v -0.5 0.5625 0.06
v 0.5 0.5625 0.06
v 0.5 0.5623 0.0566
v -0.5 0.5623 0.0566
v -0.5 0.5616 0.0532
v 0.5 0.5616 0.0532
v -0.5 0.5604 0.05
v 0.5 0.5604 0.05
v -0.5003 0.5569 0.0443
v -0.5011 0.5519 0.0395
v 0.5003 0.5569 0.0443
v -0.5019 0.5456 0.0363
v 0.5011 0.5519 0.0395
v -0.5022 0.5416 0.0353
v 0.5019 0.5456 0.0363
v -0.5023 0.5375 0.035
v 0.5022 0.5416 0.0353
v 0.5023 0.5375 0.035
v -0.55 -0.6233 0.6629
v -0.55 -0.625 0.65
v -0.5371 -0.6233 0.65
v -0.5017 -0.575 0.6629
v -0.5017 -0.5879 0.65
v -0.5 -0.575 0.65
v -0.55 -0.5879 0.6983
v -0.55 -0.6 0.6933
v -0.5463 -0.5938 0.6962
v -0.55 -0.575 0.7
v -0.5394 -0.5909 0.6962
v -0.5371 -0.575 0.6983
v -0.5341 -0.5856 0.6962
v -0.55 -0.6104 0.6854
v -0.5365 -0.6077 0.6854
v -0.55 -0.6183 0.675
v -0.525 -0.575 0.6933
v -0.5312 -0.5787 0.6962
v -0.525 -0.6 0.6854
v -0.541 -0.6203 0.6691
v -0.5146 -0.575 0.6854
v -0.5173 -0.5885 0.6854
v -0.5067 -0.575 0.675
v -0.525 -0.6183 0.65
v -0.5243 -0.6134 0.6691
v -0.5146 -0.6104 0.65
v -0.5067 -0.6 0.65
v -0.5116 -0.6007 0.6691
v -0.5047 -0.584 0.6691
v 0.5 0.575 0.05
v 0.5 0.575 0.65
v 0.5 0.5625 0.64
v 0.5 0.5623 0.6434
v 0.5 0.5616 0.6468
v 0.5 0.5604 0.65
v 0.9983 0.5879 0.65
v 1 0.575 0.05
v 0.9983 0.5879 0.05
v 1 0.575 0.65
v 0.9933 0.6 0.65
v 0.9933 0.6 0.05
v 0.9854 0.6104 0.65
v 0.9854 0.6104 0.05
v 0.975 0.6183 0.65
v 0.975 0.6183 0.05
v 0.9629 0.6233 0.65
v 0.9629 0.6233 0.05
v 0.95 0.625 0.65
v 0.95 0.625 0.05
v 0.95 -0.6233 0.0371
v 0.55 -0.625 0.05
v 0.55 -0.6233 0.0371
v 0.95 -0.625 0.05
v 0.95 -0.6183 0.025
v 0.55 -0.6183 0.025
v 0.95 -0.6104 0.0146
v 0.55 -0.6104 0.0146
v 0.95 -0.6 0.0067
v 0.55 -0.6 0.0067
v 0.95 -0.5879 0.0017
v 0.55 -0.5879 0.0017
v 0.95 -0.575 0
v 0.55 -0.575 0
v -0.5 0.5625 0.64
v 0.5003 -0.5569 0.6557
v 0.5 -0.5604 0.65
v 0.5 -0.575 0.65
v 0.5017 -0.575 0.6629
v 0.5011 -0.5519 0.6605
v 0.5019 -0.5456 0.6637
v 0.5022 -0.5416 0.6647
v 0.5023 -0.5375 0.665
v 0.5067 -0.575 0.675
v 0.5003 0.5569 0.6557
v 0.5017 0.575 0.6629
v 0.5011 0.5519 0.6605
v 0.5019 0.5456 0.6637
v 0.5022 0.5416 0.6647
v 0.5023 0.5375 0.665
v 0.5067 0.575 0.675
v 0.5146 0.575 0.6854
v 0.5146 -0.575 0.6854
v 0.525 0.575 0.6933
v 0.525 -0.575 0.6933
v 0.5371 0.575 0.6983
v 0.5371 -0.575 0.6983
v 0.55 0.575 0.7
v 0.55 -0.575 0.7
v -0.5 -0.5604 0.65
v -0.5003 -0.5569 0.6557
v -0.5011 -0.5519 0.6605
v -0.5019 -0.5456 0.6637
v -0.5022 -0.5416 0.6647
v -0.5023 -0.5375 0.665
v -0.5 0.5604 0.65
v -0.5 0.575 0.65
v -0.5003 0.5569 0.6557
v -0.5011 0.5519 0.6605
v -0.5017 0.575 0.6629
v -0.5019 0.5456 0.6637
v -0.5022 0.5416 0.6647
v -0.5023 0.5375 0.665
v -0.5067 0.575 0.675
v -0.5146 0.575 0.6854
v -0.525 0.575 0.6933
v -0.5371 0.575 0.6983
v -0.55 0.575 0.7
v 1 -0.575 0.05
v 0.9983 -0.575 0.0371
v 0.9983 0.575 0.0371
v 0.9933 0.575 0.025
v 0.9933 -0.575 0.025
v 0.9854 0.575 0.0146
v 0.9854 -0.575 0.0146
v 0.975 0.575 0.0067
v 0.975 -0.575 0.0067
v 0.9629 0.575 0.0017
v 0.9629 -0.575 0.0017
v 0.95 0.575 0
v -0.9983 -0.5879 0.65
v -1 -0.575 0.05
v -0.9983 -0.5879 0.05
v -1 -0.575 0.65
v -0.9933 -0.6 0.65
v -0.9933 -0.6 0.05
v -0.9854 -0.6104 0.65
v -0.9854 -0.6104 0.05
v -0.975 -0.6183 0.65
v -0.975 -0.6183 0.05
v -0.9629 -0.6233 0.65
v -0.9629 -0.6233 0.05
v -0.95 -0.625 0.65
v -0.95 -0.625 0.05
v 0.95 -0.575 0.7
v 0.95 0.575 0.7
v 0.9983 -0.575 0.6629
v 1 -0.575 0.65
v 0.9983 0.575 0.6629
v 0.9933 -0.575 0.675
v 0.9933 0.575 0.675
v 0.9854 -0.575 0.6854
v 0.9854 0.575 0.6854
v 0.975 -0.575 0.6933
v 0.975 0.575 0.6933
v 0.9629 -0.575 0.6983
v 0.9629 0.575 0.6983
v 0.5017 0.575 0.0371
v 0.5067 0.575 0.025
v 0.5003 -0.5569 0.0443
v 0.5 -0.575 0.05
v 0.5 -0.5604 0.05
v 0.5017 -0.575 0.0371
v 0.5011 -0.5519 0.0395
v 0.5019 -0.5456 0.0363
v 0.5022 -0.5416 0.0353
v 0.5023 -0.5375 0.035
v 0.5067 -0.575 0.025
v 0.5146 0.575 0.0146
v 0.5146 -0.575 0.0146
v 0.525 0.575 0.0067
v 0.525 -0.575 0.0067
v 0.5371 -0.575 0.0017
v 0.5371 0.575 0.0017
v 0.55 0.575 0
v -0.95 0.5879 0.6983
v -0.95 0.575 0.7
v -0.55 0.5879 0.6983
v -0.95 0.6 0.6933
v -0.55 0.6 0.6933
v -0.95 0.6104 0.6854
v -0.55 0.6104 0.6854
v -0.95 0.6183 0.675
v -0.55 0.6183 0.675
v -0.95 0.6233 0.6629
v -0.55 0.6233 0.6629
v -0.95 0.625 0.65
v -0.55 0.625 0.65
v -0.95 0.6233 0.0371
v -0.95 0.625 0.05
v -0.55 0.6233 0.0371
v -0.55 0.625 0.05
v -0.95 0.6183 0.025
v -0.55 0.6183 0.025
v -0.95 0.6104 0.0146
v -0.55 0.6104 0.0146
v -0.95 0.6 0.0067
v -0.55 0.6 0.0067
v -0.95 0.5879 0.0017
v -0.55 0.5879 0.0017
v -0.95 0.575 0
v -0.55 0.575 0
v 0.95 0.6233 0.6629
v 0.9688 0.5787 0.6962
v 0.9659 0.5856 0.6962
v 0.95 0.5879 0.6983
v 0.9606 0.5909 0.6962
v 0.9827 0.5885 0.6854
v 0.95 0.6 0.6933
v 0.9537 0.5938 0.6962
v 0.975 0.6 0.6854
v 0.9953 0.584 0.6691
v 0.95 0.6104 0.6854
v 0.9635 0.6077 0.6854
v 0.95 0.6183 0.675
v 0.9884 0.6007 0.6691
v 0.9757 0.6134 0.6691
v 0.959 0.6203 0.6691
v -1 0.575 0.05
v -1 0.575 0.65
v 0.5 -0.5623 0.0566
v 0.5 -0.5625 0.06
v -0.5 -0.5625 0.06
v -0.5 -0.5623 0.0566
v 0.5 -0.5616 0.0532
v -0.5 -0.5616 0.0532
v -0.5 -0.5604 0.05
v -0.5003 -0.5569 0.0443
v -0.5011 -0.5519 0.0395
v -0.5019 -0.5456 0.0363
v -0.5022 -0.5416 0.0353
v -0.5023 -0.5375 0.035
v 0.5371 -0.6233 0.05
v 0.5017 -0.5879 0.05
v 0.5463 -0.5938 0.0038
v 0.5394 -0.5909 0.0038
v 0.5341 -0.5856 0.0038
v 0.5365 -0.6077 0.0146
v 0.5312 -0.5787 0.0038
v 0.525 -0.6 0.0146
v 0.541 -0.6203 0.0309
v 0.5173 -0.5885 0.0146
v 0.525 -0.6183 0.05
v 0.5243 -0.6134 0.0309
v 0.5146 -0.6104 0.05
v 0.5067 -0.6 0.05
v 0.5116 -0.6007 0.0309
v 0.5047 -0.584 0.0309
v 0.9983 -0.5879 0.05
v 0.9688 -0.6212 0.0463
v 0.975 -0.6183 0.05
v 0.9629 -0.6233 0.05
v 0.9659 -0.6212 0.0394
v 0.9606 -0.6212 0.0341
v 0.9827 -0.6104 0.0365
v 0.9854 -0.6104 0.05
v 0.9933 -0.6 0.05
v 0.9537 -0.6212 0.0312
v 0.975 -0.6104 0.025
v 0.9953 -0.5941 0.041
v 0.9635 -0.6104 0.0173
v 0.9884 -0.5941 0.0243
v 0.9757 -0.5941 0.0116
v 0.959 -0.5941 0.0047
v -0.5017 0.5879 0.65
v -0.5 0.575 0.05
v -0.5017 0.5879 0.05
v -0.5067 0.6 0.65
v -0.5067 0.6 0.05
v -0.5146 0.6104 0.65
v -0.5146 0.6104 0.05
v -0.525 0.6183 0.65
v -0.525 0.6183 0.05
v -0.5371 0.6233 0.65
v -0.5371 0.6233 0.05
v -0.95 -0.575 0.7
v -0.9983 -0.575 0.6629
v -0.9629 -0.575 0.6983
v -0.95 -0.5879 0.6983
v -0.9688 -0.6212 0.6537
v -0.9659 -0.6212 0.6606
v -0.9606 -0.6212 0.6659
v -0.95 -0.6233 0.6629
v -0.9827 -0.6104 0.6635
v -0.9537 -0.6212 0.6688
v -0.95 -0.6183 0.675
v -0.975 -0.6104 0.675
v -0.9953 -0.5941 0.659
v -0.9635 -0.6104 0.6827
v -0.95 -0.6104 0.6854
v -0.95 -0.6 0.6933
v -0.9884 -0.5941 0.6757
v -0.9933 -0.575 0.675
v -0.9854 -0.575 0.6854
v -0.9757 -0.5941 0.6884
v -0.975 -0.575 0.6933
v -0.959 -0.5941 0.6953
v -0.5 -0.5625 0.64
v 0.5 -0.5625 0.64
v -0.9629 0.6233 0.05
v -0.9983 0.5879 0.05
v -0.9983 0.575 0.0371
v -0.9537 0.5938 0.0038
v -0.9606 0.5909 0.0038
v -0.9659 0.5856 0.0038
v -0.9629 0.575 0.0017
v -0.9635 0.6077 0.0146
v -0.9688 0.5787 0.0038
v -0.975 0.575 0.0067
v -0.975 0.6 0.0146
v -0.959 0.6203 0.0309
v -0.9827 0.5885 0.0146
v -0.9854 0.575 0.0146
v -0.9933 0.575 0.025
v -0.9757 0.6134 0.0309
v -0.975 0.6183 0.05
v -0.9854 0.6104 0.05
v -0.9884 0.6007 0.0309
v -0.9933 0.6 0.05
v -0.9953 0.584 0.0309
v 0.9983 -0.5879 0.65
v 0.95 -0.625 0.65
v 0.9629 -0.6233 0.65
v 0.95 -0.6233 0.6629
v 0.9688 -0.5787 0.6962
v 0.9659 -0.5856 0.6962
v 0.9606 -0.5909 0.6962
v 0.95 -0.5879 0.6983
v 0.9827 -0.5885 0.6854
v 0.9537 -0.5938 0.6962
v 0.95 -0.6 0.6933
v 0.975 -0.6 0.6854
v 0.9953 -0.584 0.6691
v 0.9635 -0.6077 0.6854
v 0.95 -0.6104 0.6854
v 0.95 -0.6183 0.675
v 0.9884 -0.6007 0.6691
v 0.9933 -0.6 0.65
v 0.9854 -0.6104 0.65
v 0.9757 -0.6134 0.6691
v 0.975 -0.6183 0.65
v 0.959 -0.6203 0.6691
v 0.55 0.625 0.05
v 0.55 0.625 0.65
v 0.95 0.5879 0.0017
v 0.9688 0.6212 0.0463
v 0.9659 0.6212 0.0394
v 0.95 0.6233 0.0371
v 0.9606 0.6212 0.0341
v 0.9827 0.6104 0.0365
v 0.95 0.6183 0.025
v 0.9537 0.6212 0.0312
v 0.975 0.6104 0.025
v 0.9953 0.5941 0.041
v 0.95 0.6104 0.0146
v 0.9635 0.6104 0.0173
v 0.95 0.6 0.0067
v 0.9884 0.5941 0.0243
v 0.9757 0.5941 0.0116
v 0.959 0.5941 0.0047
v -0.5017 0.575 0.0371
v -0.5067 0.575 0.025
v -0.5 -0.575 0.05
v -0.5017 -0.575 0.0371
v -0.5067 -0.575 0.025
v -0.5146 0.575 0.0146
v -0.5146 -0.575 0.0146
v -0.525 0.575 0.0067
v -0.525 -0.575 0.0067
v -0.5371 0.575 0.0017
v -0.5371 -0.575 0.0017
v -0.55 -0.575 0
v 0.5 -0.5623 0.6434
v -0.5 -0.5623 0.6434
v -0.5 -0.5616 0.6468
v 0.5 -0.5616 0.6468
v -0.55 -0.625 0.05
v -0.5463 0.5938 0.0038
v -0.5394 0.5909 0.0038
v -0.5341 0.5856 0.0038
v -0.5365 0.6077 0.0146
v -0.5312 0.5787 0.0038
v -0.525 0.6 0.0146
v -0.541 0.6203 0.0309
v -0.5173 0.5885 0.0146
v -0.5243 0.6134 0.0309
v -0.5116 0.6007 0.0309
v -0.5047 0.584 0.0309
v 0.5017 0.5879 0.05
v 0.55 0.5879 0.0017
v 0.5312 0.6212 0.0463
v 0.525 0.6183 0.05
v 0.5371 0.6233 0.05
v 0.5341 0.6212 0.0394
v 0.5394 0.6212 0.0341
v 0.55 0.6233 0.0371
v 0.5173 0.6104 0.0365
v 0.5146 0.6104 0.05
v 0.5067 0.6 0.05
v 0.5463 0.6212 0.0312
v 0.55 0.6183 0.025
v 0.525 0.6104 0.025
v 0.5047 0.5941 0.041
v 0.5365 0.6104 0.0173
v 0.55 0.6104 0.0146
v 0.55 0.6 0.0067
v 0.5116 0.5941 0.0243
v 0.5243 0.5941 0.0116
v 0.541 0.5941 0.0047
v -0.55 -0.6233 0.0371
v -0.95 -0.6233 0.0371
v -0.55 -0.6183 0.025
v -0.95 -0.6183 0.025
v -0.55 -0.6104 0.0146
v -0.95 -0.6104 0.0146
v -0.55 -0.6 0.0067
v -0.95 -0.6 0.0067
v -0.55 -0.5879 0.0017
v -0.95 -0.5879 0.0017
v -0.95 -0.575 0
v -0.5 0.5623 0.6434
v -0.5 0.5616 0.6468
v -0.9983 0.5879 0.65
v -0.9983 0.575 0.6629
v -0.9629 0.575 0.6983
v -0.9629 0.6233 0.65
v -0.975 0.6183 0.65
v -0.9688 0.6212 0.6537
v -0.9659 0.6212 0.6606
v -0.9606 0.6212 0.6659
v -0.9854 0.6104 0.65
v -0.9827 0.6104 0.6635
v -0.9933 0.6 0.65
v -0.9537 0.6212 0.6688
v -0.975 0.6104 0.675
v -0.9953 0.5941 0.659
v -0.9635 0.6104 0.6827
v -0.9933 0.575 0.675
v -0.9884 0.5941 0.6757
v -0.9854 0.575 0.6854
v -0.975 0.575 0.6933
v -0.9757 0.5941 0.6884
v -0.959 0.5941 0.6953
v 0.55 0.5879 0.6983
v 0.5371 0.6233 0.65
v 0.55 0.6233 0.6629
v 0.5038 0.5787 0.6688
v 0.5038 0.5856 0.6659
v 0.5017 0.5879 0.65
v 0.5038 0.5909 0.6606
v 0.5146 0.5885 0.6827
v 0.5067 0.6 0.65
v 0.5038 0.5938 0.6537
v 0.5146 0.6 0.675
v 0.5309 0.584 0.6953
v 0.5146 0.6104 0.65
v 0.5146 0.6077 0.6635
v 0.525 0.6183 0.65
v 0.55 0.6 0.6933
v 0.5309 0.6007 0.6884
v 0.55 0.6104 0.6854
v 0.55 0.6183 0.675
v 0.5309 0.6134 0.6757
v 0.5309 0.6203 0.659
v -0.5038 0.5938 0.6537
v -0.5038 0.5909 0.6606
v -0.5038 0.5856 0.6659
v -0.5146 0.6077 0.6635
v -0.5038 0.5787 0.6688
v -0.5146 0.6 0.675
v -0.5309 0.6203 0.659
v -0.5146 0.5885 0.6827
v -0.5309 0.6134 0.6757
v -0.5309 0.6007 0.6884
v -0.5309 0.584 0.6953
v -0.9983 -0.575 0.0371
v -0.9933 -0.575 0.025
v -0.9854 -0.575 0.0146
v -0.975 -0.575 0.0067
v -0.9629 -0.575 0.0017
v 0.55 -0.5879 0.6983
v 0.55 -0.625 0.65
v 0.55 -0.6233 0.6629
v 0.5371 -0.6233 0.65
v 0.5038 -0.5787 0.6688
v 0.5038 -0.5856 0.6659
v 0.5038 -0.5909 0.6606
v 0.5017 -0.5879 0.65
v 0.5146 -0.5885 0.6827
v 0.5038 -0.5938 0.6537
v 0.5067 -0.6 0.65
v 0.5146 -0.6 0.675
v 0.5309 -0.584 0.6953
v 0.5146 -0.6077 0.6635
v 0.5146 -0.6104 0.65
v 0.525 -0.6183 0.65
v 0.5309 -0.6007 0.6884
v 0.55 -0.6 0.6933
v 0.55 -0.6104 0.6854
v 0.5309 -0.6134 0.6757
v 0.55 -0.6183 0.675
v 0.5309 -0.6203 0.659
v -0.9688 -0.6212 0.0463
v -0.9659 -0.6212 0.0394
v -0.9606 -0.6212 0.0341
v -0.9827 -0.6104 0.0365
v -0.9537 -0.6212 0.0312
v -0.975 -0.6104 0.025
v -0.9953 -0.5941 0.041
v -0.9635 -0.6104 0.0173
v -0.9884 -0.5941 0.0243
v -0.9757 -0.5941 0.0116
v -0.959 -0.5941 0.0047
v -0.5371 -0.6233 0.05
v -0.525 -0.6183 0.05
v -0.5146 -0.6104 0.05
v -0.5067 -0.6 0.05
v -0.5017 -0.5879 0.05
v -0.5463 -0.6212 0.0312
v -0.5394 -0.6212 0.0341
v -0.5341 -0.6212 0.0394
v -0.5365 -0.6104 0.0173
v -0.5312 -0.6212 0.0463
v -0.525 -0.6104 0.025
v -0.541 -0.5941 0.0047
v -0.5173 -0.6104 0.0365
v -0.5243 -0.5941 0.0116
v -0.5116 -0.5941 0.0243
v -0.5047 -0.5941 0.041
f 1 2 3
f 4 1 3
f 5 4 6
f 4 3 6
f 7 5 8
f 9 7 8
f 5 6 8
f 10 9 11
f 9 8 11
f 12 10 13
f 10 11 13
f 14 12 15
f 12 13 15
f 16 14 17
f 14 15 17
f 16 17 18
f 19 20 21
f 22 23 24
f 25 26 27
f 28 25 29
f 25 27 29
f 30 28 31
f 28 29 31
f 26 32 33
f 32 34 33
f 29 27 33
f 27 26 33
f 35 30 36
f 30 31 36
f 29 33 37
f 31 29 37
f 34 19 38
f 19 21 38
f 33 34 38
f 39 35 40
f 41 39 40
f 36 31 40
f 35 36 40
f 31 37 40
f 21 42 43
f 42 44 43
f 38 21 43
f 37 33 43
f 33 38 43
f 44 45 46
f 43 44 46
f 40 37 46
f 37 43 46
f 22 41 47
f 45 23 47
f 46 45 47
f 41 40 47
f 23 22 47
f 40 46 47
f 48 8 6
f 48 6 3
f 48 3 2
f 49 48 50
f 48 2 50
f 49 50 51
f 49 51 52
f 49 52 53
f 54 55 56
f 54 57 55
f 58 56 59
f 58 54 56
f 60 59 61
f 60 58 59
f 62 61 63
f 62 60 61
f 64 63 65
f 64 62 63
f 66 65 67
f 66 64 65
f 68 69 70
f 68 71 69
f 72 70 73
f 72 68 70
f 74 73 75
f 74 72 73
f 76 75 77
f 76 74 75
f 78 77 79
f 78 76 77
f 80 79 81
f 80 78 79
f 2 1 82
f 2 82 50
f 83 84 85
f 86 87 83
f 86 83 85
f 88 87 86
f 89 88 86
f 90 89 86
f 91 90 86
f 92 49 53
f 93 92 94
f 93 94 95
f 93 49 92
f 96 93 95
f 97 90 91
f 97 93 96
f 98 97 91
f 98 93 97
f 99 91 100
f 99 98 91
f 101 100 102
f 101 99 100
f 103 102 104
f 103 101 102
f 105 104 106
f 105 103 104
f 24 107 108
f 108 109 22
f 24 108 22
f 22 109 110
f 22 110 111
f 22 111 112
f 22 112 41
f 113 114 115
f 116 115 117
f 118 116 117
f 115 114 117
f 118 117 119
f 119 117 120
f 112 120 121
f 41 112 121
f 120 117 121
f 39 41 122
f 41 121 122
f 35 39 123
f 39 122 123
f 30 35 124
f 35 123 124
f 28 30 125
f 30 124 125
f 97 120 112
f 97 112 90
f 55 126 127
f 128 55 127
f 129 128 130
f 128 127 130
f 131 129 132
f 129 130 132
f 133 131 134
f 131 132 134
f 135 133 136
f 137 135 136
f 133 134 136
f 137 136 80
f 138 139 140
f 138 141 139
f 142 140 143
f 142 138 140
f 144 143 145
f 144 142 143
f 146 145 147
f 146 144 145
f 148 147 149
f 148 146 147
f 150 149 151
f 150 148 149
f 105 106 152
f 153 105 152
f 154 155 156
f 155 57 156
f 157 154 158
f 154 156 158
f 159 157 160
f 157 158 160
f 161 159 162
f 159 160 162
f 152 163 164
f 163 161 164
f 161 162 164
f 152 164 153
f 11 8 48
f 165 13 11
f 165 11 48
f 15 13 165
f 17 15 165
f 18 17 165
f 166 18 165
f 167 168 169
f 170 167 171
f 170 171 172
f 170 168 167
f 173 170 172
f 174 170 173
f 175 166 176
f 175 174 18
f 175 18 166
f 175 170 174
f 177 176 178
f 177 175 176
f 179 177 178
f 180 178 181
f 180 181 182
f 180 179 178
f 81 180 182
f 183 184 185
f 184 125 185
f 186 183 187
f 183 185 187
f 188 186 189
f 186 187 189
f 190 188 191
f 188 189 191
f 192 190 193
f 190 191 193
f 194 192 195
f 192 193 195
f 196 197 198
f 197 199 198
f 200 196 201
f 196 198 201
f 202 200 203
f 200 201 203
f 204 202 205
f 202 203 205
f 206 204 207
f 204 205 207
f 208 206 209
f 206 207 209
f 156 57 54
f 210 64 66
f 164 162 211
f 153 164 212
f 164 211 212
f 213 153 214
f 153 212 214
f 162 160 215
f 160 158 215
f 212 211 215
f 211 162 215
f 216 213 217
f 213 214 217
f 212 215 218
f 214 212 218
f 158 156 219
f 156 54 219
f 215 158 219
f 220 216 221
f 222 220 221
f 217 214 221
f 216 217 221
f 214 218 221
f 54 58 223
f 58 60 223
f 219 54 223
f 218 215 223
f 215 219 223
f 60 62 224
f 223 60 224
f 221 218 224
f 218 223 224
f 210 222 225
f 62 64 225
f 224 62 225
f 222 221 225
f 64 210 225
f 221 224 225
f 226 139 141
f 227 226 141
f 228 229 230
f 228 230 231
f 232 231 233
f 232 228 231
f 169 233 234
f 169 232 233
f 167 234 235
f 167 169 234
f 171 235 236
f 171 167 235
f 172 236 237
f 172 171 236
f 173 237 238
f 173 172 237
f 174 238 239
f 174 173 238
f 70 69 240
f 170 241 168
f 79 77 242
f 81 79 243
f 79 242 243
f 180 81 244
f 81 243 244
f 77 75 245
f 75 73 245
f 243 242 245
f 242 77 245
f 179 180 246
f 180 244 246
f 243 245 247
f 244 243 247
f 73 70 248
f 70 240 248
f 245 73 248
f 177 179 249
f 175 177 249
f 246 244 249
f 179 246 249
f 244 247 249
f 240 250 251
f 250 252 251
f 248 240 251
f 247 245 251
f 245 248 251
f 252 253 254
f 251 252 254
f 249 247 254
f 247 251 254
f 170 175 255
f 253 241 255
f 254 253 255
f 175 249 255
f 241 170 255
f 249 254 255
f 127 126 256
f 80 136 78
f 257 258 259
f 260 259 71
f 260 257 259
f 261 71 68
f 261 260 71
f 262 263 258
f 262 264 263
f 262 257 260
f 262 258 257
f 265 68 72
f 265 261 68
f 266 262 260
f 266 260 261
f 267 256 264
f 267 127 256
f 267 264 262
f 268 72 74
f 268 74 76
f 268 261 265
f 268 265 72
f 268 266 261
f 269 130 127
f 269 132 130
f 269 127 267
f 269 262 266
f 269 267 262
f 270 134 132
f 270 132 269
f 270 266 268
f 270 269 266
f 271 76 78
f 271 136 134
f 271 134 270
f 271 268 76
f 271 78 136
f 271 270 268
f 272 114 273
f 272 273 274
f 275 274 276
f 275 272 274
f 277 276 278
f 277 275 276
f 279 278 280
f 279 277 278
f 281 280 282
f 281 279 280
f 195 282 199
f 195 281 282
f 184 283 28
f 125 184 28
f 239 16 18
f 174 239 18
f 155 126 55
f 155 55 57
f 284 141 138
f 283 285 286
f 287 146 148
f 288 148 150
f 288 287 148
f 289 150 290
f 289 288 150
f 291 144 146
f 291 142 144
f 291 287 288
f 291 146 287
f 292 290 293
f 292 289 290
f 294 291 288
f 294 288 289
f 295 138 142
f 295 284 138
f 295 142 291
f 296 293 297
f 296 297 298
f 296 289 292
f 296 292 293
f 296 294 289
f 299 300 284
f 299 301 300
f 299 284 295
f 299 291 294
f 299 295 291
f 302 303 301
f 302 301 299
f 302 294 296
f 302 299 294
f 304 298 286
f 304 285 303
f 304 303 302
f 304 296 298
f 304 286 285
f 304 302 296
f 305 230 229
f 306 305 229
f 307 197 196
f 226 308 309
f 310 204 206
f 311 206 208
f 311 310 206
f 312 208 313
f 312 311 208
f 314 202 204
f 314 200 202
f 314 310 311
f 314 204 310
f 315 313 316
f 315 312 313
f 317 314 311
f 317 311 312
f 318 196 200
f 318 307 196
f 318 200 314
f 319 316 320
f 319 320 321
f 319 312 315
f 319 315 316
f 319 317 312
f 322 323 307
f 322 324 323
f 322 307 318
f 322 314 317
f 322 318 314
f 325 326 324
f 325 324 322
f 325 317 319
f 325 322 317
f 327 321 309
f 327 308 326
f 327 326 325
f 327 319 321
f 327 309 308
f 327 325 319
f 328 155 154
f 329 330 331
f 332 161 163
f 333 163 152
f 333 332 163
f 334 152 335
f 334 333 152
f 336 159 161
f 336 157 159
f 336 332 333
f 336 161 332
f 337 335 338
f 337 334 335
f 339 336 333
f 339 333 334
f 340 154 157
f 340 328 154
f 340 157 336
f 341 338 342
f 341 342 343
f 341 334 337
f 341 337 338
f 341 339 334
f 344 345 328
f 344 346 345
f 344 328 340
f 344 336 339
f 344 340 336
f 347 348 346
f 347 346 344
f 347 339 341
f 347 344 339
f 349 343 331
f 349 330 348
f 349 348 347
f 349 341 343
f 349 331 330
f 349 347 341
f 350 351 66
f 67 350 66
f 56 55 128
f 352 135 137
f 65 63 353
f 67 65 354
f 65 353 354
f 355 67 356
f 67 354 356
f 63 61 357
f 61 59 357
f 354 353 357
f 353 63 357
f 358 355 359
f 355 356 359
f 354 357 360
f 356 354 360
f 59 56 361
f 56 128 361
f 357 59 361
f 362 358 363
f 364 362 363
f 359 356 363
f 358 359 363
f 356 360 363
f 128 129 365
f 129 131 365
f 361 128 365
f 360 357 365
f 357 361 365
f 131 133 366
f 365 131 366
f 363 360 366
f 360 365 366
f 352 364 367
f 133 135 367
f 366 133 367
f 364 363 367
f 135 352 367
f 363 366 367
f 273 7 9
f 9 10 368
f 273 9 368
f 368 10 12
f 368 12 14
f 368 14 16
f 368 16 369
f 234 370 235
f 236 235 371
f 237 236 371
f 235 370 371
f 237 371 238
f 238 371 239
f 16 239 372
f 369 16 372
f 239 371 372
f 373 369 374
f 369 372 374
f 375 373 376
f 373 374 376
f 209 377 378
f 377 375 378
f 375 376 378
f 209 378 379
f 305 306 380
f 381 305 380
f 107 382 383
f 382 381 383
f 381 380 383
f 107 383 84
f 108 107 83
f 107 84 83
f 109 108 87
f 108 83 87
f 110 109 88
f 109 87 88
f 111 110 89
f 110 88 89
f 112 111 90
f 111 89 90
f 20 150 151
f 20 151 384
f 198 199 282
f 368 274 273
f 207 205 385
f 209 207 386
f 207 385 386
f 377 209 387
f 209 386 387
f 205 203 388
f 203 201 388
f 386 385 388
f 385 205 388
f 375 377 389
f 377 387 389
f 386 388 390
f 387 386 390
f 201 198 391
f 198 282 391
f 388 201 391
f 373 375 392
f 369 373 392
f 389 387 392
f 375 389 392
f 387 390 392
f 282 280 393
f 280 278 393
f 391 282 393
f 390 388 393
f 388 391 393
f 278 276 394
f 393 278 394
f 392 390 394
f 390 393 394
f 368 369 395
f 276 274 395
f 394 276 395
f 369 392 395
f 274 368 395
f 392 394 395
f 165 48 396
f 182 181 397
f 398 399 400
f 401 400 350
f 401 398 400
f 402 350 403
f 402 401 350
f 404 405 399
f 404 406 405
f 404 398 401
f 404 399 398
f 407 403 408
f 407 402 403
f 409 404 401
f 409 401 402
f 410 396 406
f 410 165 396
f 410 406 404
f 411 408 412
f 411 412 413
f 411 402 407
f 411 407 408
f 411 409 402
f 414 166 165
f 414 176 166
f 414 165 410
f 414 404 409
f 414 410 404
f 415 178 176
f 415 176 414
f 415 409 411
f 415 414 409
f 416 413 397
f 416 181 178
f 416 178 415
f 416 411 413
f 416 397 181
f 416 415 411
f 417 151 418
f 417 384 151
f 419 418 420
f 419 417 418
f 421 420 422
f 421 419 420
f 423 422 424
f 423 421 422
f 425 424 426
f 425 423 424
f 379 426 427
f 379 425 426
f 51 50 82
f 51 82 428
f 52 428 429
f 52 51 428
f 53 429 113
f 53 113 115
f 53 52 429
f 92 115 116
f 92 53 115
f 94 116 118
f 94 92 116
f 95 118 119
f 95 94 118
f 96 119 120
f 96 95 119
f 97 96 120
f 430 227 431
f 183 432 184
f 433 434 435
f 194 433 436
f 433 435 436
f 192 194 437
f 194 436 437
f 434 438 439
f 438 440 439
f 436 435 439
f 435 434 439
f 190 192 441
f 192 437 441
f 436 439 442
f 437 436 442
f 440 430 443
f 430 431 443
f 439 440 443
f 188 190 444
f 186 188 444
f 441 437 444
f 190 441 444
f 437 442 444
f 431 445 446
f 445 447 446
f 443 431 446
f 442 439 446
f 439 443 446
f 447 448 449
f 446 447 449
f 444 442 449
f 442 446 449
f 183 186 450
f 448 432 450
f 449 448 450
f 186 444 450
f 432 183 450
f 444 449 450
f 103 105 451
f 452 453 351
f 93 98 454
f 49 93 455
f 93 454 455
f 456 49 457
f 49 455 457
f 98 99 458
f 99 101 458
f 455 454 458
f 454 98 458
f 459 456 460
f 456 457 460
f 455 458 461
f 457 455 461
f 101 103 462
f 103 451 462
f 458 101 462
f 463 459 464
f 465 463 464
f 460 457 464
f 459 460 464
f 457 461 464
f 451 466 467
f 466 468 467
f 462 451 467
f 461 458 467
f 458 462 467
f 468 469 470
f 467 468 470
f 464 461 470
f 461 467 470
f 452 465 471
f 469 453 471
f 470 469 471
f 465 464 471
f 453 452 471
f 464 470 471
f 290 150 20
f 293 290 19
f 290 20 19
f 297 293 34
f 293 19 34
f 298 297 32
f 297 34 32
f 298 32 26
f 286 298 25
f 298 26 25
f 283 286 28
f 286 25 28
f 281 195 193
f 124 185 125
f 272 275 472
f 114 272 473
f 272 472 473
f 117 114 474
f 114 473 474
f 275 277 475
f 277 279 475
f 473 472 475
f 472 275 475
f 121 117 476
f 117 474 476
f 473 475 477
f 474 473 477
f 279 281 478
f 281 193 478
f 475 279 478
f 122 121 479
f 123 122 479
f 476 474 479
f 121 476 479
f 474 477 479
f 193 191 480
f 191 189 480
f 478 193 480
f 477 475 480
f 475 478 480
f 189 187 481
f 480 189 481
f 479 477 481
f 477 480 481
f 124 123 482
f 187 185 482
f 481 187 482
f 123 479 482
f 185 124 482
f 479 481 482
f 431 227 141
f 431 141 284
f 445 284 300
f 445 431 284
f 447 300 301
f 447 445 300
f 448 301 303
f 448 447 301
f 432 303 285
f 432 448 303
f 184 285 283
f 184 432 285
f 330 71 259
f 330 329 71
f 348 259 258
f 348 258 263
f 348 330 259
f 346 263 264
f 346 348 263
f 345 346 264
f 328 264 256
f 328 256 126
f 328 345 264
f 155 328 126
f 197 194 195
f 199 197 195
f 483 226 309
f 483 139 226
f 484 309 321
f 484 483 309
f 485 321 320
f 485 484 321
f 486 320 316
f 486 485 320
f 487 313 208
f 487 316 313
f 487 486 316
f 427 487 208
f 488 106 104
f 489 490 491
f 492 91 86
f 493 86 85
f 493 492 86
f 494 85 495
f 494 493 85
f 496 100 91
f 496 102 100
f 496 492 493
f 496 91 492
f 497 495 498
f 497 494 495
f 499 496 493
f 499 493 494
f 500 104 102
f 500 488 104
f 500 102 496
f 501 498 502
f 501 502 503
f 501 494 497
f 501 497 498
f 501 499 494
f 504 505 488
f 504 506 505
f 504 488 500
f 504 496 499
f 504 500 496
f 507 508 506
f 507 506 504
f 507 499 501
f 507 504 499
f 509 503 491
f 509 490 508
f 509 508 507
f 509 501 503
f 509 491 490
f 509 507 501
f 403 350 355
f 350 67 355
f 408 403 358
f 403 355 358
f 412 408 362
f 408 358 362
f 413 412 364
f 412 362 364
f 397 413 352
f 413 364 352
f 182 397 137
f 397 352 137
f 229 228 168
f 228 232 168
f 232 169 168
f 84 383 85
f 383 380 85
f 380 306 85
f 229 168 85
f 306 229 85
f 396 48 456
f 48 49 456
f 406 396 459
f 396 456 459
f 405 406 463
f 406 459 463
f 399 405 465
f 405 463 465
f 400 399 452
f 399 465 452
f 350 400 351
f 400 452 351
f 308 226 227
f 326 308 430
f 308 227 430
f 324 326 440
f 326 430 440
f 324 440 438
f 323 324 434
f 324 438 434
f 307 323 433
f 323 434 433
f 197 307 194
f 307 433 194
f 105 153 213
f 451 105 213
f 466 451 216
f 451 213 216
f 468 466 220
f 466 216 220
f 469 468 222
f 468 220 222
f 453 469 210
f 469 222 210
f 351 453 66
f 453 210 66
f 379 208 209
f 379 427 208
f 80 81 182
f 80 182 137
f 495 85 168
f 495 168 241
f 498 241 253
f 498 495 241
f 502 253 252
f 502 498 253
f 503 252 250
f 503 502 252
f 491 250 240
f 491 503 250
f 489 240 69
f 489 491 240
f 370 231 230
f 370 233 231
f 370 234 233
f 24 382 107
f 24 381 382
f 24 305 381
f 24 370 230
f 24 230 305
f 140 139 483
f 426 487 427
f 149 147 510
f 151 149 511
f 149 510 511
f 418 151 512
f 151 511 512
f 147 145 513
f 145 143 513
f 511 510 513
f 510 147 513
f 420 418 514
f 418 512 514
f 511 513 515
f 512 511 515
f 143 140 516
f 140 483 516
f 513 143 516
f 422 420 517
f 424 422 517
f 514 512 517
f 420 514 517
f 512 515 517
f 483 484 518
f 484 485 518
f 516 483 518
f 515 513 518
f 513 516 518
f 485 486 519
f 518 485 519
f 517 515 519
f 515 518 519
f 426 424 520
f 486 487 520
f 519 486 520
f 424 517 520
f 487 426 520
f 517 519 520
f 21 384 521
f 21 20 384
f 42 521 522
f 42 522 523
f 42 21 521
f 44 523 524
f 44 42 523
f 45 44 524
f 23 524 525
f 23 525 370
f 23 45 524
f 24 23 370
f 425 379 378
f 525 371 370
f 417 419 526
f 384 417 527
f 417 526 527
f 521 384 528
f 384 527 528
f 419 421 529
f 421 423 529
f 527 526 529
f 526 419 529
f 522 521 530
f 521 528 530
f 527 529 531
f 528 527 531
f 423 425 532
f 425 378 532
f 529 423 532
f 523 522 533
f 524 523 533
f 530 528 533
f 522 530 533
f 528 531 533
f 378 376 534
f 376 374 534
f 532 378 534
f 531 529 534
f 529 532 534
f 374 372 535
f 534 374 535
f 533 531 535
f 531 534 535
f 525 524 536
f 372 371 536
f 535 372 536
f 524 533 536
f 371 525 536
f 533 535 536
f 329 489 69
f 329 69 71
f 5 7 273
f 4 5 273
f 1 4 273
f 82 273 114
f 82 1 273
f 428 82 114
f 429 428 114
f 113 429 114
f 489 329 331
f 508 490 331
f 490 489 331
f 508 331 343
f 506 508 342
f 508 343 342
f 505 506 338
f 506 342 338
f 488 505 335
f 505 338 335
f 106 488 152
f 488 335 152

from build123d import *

# Parameters (mm, degrees)
SKETCH001_W  = 0.5
SKETCH001_H  = 0.7
PAD001_DEPTH = 0.625
FILLET_R     = 0.05
SKETCH002_W  = 0.5
SKETCH002_H  = 0.7
PAD002_DEPTH = 0.625
FILLET001_R  = 0.05
SKETCH_W     = 1.8
SKETCH_H     = 1.125
PAD_DEPTH    = 0.63
FILLET002_R  = 0.025


with BuildPart() as body001:
    # Sketch001 → Pad001 (new body, symmetric)
    with BuildSketch(Plane.XZ):
        with Locations((-0.75, 0.35)):
            Rectangle(SKETCH001_W, SKETCH001_H)
    extrude(amount=PAD001_DEPTH, both=True)

    # Fillet
    fillet_edges = [body001.edges().sort_by_distance(p)[0] for p in [
        (-1, 0, 0.7),
        (-1, 0.625, 0.35),
        (-0.75, 0.625, 0.7),
        (-0.5, 0.625, 0.35),
        (-0.75, 0.625, 0),
        (-0.5, 0, 0),
        (-1, 0, 0),
        (-1, -0.625, 0.35),
        (-0.75, -0.625, 0),
        (-0.5, -0.625, 0.35),
        (-0.75, -0.625, 0.7),
        (-0.5, 0, 0.7),
    ]]
    fillet(fillet_edges, radius=FILLET_R)


with BuildPart() as body002:
    # Sketch002 → Pad002 (new body, symmetric)
    with BuildSketch(Plane.XZ):
        with Locations((0.75, 0.35)):
            Rectangle(SKETCH002_W, SKETCH002_H)
    extrude(amount=PAD002_DEPTH, both=True)

    # Fillet001
    fillet001_edges = [body002.edges().sort_by_distance(p)[0] for p in [
        (1, 0, 0),
        (1, 0.625, 0.35),
        (1, -0.625, 0.35),
        (1, 0, 0.7),
        (0.75, -0.625, 0.7),
        (0.75, 0.625, 0.7),
        (0.5, 0, 0.7),
        (0.5, -0.625, 0.35),
        (0.75, -0.625, 0),
        (0.5, 0, 0),
        (0.5, 0.625, 0.35),
        (0.75, 0.625, 0),
    ]]
    fillet(fillet001_edges, radius=FILLET001_R)


with BuildPart() as fusion:
    # Sketch → Pad (new body)
    with BuildSketch(Plane.XY.offset(0.035)):
        Rectangle(SKETCH_W, SKETCH_H)
    extrude(amount=PAD_DEPTH)

    # Fillet002
    fillet002_edges = [fusion.edges().sort_by_distance(p)[0] for p in [
        (0, -0.5625, 0.665),
        (0, 0.5625, 0.665),
        (0, -0.5625, 0.035),
        (0, 0.5625, 0.035),
    ]]
    fillet(fillet002_edges, radius=FILLET002_R)

    # Fusion: union Body001, Body002
    add(body001.part)
    add(body002.part)


solid = fusion.part
